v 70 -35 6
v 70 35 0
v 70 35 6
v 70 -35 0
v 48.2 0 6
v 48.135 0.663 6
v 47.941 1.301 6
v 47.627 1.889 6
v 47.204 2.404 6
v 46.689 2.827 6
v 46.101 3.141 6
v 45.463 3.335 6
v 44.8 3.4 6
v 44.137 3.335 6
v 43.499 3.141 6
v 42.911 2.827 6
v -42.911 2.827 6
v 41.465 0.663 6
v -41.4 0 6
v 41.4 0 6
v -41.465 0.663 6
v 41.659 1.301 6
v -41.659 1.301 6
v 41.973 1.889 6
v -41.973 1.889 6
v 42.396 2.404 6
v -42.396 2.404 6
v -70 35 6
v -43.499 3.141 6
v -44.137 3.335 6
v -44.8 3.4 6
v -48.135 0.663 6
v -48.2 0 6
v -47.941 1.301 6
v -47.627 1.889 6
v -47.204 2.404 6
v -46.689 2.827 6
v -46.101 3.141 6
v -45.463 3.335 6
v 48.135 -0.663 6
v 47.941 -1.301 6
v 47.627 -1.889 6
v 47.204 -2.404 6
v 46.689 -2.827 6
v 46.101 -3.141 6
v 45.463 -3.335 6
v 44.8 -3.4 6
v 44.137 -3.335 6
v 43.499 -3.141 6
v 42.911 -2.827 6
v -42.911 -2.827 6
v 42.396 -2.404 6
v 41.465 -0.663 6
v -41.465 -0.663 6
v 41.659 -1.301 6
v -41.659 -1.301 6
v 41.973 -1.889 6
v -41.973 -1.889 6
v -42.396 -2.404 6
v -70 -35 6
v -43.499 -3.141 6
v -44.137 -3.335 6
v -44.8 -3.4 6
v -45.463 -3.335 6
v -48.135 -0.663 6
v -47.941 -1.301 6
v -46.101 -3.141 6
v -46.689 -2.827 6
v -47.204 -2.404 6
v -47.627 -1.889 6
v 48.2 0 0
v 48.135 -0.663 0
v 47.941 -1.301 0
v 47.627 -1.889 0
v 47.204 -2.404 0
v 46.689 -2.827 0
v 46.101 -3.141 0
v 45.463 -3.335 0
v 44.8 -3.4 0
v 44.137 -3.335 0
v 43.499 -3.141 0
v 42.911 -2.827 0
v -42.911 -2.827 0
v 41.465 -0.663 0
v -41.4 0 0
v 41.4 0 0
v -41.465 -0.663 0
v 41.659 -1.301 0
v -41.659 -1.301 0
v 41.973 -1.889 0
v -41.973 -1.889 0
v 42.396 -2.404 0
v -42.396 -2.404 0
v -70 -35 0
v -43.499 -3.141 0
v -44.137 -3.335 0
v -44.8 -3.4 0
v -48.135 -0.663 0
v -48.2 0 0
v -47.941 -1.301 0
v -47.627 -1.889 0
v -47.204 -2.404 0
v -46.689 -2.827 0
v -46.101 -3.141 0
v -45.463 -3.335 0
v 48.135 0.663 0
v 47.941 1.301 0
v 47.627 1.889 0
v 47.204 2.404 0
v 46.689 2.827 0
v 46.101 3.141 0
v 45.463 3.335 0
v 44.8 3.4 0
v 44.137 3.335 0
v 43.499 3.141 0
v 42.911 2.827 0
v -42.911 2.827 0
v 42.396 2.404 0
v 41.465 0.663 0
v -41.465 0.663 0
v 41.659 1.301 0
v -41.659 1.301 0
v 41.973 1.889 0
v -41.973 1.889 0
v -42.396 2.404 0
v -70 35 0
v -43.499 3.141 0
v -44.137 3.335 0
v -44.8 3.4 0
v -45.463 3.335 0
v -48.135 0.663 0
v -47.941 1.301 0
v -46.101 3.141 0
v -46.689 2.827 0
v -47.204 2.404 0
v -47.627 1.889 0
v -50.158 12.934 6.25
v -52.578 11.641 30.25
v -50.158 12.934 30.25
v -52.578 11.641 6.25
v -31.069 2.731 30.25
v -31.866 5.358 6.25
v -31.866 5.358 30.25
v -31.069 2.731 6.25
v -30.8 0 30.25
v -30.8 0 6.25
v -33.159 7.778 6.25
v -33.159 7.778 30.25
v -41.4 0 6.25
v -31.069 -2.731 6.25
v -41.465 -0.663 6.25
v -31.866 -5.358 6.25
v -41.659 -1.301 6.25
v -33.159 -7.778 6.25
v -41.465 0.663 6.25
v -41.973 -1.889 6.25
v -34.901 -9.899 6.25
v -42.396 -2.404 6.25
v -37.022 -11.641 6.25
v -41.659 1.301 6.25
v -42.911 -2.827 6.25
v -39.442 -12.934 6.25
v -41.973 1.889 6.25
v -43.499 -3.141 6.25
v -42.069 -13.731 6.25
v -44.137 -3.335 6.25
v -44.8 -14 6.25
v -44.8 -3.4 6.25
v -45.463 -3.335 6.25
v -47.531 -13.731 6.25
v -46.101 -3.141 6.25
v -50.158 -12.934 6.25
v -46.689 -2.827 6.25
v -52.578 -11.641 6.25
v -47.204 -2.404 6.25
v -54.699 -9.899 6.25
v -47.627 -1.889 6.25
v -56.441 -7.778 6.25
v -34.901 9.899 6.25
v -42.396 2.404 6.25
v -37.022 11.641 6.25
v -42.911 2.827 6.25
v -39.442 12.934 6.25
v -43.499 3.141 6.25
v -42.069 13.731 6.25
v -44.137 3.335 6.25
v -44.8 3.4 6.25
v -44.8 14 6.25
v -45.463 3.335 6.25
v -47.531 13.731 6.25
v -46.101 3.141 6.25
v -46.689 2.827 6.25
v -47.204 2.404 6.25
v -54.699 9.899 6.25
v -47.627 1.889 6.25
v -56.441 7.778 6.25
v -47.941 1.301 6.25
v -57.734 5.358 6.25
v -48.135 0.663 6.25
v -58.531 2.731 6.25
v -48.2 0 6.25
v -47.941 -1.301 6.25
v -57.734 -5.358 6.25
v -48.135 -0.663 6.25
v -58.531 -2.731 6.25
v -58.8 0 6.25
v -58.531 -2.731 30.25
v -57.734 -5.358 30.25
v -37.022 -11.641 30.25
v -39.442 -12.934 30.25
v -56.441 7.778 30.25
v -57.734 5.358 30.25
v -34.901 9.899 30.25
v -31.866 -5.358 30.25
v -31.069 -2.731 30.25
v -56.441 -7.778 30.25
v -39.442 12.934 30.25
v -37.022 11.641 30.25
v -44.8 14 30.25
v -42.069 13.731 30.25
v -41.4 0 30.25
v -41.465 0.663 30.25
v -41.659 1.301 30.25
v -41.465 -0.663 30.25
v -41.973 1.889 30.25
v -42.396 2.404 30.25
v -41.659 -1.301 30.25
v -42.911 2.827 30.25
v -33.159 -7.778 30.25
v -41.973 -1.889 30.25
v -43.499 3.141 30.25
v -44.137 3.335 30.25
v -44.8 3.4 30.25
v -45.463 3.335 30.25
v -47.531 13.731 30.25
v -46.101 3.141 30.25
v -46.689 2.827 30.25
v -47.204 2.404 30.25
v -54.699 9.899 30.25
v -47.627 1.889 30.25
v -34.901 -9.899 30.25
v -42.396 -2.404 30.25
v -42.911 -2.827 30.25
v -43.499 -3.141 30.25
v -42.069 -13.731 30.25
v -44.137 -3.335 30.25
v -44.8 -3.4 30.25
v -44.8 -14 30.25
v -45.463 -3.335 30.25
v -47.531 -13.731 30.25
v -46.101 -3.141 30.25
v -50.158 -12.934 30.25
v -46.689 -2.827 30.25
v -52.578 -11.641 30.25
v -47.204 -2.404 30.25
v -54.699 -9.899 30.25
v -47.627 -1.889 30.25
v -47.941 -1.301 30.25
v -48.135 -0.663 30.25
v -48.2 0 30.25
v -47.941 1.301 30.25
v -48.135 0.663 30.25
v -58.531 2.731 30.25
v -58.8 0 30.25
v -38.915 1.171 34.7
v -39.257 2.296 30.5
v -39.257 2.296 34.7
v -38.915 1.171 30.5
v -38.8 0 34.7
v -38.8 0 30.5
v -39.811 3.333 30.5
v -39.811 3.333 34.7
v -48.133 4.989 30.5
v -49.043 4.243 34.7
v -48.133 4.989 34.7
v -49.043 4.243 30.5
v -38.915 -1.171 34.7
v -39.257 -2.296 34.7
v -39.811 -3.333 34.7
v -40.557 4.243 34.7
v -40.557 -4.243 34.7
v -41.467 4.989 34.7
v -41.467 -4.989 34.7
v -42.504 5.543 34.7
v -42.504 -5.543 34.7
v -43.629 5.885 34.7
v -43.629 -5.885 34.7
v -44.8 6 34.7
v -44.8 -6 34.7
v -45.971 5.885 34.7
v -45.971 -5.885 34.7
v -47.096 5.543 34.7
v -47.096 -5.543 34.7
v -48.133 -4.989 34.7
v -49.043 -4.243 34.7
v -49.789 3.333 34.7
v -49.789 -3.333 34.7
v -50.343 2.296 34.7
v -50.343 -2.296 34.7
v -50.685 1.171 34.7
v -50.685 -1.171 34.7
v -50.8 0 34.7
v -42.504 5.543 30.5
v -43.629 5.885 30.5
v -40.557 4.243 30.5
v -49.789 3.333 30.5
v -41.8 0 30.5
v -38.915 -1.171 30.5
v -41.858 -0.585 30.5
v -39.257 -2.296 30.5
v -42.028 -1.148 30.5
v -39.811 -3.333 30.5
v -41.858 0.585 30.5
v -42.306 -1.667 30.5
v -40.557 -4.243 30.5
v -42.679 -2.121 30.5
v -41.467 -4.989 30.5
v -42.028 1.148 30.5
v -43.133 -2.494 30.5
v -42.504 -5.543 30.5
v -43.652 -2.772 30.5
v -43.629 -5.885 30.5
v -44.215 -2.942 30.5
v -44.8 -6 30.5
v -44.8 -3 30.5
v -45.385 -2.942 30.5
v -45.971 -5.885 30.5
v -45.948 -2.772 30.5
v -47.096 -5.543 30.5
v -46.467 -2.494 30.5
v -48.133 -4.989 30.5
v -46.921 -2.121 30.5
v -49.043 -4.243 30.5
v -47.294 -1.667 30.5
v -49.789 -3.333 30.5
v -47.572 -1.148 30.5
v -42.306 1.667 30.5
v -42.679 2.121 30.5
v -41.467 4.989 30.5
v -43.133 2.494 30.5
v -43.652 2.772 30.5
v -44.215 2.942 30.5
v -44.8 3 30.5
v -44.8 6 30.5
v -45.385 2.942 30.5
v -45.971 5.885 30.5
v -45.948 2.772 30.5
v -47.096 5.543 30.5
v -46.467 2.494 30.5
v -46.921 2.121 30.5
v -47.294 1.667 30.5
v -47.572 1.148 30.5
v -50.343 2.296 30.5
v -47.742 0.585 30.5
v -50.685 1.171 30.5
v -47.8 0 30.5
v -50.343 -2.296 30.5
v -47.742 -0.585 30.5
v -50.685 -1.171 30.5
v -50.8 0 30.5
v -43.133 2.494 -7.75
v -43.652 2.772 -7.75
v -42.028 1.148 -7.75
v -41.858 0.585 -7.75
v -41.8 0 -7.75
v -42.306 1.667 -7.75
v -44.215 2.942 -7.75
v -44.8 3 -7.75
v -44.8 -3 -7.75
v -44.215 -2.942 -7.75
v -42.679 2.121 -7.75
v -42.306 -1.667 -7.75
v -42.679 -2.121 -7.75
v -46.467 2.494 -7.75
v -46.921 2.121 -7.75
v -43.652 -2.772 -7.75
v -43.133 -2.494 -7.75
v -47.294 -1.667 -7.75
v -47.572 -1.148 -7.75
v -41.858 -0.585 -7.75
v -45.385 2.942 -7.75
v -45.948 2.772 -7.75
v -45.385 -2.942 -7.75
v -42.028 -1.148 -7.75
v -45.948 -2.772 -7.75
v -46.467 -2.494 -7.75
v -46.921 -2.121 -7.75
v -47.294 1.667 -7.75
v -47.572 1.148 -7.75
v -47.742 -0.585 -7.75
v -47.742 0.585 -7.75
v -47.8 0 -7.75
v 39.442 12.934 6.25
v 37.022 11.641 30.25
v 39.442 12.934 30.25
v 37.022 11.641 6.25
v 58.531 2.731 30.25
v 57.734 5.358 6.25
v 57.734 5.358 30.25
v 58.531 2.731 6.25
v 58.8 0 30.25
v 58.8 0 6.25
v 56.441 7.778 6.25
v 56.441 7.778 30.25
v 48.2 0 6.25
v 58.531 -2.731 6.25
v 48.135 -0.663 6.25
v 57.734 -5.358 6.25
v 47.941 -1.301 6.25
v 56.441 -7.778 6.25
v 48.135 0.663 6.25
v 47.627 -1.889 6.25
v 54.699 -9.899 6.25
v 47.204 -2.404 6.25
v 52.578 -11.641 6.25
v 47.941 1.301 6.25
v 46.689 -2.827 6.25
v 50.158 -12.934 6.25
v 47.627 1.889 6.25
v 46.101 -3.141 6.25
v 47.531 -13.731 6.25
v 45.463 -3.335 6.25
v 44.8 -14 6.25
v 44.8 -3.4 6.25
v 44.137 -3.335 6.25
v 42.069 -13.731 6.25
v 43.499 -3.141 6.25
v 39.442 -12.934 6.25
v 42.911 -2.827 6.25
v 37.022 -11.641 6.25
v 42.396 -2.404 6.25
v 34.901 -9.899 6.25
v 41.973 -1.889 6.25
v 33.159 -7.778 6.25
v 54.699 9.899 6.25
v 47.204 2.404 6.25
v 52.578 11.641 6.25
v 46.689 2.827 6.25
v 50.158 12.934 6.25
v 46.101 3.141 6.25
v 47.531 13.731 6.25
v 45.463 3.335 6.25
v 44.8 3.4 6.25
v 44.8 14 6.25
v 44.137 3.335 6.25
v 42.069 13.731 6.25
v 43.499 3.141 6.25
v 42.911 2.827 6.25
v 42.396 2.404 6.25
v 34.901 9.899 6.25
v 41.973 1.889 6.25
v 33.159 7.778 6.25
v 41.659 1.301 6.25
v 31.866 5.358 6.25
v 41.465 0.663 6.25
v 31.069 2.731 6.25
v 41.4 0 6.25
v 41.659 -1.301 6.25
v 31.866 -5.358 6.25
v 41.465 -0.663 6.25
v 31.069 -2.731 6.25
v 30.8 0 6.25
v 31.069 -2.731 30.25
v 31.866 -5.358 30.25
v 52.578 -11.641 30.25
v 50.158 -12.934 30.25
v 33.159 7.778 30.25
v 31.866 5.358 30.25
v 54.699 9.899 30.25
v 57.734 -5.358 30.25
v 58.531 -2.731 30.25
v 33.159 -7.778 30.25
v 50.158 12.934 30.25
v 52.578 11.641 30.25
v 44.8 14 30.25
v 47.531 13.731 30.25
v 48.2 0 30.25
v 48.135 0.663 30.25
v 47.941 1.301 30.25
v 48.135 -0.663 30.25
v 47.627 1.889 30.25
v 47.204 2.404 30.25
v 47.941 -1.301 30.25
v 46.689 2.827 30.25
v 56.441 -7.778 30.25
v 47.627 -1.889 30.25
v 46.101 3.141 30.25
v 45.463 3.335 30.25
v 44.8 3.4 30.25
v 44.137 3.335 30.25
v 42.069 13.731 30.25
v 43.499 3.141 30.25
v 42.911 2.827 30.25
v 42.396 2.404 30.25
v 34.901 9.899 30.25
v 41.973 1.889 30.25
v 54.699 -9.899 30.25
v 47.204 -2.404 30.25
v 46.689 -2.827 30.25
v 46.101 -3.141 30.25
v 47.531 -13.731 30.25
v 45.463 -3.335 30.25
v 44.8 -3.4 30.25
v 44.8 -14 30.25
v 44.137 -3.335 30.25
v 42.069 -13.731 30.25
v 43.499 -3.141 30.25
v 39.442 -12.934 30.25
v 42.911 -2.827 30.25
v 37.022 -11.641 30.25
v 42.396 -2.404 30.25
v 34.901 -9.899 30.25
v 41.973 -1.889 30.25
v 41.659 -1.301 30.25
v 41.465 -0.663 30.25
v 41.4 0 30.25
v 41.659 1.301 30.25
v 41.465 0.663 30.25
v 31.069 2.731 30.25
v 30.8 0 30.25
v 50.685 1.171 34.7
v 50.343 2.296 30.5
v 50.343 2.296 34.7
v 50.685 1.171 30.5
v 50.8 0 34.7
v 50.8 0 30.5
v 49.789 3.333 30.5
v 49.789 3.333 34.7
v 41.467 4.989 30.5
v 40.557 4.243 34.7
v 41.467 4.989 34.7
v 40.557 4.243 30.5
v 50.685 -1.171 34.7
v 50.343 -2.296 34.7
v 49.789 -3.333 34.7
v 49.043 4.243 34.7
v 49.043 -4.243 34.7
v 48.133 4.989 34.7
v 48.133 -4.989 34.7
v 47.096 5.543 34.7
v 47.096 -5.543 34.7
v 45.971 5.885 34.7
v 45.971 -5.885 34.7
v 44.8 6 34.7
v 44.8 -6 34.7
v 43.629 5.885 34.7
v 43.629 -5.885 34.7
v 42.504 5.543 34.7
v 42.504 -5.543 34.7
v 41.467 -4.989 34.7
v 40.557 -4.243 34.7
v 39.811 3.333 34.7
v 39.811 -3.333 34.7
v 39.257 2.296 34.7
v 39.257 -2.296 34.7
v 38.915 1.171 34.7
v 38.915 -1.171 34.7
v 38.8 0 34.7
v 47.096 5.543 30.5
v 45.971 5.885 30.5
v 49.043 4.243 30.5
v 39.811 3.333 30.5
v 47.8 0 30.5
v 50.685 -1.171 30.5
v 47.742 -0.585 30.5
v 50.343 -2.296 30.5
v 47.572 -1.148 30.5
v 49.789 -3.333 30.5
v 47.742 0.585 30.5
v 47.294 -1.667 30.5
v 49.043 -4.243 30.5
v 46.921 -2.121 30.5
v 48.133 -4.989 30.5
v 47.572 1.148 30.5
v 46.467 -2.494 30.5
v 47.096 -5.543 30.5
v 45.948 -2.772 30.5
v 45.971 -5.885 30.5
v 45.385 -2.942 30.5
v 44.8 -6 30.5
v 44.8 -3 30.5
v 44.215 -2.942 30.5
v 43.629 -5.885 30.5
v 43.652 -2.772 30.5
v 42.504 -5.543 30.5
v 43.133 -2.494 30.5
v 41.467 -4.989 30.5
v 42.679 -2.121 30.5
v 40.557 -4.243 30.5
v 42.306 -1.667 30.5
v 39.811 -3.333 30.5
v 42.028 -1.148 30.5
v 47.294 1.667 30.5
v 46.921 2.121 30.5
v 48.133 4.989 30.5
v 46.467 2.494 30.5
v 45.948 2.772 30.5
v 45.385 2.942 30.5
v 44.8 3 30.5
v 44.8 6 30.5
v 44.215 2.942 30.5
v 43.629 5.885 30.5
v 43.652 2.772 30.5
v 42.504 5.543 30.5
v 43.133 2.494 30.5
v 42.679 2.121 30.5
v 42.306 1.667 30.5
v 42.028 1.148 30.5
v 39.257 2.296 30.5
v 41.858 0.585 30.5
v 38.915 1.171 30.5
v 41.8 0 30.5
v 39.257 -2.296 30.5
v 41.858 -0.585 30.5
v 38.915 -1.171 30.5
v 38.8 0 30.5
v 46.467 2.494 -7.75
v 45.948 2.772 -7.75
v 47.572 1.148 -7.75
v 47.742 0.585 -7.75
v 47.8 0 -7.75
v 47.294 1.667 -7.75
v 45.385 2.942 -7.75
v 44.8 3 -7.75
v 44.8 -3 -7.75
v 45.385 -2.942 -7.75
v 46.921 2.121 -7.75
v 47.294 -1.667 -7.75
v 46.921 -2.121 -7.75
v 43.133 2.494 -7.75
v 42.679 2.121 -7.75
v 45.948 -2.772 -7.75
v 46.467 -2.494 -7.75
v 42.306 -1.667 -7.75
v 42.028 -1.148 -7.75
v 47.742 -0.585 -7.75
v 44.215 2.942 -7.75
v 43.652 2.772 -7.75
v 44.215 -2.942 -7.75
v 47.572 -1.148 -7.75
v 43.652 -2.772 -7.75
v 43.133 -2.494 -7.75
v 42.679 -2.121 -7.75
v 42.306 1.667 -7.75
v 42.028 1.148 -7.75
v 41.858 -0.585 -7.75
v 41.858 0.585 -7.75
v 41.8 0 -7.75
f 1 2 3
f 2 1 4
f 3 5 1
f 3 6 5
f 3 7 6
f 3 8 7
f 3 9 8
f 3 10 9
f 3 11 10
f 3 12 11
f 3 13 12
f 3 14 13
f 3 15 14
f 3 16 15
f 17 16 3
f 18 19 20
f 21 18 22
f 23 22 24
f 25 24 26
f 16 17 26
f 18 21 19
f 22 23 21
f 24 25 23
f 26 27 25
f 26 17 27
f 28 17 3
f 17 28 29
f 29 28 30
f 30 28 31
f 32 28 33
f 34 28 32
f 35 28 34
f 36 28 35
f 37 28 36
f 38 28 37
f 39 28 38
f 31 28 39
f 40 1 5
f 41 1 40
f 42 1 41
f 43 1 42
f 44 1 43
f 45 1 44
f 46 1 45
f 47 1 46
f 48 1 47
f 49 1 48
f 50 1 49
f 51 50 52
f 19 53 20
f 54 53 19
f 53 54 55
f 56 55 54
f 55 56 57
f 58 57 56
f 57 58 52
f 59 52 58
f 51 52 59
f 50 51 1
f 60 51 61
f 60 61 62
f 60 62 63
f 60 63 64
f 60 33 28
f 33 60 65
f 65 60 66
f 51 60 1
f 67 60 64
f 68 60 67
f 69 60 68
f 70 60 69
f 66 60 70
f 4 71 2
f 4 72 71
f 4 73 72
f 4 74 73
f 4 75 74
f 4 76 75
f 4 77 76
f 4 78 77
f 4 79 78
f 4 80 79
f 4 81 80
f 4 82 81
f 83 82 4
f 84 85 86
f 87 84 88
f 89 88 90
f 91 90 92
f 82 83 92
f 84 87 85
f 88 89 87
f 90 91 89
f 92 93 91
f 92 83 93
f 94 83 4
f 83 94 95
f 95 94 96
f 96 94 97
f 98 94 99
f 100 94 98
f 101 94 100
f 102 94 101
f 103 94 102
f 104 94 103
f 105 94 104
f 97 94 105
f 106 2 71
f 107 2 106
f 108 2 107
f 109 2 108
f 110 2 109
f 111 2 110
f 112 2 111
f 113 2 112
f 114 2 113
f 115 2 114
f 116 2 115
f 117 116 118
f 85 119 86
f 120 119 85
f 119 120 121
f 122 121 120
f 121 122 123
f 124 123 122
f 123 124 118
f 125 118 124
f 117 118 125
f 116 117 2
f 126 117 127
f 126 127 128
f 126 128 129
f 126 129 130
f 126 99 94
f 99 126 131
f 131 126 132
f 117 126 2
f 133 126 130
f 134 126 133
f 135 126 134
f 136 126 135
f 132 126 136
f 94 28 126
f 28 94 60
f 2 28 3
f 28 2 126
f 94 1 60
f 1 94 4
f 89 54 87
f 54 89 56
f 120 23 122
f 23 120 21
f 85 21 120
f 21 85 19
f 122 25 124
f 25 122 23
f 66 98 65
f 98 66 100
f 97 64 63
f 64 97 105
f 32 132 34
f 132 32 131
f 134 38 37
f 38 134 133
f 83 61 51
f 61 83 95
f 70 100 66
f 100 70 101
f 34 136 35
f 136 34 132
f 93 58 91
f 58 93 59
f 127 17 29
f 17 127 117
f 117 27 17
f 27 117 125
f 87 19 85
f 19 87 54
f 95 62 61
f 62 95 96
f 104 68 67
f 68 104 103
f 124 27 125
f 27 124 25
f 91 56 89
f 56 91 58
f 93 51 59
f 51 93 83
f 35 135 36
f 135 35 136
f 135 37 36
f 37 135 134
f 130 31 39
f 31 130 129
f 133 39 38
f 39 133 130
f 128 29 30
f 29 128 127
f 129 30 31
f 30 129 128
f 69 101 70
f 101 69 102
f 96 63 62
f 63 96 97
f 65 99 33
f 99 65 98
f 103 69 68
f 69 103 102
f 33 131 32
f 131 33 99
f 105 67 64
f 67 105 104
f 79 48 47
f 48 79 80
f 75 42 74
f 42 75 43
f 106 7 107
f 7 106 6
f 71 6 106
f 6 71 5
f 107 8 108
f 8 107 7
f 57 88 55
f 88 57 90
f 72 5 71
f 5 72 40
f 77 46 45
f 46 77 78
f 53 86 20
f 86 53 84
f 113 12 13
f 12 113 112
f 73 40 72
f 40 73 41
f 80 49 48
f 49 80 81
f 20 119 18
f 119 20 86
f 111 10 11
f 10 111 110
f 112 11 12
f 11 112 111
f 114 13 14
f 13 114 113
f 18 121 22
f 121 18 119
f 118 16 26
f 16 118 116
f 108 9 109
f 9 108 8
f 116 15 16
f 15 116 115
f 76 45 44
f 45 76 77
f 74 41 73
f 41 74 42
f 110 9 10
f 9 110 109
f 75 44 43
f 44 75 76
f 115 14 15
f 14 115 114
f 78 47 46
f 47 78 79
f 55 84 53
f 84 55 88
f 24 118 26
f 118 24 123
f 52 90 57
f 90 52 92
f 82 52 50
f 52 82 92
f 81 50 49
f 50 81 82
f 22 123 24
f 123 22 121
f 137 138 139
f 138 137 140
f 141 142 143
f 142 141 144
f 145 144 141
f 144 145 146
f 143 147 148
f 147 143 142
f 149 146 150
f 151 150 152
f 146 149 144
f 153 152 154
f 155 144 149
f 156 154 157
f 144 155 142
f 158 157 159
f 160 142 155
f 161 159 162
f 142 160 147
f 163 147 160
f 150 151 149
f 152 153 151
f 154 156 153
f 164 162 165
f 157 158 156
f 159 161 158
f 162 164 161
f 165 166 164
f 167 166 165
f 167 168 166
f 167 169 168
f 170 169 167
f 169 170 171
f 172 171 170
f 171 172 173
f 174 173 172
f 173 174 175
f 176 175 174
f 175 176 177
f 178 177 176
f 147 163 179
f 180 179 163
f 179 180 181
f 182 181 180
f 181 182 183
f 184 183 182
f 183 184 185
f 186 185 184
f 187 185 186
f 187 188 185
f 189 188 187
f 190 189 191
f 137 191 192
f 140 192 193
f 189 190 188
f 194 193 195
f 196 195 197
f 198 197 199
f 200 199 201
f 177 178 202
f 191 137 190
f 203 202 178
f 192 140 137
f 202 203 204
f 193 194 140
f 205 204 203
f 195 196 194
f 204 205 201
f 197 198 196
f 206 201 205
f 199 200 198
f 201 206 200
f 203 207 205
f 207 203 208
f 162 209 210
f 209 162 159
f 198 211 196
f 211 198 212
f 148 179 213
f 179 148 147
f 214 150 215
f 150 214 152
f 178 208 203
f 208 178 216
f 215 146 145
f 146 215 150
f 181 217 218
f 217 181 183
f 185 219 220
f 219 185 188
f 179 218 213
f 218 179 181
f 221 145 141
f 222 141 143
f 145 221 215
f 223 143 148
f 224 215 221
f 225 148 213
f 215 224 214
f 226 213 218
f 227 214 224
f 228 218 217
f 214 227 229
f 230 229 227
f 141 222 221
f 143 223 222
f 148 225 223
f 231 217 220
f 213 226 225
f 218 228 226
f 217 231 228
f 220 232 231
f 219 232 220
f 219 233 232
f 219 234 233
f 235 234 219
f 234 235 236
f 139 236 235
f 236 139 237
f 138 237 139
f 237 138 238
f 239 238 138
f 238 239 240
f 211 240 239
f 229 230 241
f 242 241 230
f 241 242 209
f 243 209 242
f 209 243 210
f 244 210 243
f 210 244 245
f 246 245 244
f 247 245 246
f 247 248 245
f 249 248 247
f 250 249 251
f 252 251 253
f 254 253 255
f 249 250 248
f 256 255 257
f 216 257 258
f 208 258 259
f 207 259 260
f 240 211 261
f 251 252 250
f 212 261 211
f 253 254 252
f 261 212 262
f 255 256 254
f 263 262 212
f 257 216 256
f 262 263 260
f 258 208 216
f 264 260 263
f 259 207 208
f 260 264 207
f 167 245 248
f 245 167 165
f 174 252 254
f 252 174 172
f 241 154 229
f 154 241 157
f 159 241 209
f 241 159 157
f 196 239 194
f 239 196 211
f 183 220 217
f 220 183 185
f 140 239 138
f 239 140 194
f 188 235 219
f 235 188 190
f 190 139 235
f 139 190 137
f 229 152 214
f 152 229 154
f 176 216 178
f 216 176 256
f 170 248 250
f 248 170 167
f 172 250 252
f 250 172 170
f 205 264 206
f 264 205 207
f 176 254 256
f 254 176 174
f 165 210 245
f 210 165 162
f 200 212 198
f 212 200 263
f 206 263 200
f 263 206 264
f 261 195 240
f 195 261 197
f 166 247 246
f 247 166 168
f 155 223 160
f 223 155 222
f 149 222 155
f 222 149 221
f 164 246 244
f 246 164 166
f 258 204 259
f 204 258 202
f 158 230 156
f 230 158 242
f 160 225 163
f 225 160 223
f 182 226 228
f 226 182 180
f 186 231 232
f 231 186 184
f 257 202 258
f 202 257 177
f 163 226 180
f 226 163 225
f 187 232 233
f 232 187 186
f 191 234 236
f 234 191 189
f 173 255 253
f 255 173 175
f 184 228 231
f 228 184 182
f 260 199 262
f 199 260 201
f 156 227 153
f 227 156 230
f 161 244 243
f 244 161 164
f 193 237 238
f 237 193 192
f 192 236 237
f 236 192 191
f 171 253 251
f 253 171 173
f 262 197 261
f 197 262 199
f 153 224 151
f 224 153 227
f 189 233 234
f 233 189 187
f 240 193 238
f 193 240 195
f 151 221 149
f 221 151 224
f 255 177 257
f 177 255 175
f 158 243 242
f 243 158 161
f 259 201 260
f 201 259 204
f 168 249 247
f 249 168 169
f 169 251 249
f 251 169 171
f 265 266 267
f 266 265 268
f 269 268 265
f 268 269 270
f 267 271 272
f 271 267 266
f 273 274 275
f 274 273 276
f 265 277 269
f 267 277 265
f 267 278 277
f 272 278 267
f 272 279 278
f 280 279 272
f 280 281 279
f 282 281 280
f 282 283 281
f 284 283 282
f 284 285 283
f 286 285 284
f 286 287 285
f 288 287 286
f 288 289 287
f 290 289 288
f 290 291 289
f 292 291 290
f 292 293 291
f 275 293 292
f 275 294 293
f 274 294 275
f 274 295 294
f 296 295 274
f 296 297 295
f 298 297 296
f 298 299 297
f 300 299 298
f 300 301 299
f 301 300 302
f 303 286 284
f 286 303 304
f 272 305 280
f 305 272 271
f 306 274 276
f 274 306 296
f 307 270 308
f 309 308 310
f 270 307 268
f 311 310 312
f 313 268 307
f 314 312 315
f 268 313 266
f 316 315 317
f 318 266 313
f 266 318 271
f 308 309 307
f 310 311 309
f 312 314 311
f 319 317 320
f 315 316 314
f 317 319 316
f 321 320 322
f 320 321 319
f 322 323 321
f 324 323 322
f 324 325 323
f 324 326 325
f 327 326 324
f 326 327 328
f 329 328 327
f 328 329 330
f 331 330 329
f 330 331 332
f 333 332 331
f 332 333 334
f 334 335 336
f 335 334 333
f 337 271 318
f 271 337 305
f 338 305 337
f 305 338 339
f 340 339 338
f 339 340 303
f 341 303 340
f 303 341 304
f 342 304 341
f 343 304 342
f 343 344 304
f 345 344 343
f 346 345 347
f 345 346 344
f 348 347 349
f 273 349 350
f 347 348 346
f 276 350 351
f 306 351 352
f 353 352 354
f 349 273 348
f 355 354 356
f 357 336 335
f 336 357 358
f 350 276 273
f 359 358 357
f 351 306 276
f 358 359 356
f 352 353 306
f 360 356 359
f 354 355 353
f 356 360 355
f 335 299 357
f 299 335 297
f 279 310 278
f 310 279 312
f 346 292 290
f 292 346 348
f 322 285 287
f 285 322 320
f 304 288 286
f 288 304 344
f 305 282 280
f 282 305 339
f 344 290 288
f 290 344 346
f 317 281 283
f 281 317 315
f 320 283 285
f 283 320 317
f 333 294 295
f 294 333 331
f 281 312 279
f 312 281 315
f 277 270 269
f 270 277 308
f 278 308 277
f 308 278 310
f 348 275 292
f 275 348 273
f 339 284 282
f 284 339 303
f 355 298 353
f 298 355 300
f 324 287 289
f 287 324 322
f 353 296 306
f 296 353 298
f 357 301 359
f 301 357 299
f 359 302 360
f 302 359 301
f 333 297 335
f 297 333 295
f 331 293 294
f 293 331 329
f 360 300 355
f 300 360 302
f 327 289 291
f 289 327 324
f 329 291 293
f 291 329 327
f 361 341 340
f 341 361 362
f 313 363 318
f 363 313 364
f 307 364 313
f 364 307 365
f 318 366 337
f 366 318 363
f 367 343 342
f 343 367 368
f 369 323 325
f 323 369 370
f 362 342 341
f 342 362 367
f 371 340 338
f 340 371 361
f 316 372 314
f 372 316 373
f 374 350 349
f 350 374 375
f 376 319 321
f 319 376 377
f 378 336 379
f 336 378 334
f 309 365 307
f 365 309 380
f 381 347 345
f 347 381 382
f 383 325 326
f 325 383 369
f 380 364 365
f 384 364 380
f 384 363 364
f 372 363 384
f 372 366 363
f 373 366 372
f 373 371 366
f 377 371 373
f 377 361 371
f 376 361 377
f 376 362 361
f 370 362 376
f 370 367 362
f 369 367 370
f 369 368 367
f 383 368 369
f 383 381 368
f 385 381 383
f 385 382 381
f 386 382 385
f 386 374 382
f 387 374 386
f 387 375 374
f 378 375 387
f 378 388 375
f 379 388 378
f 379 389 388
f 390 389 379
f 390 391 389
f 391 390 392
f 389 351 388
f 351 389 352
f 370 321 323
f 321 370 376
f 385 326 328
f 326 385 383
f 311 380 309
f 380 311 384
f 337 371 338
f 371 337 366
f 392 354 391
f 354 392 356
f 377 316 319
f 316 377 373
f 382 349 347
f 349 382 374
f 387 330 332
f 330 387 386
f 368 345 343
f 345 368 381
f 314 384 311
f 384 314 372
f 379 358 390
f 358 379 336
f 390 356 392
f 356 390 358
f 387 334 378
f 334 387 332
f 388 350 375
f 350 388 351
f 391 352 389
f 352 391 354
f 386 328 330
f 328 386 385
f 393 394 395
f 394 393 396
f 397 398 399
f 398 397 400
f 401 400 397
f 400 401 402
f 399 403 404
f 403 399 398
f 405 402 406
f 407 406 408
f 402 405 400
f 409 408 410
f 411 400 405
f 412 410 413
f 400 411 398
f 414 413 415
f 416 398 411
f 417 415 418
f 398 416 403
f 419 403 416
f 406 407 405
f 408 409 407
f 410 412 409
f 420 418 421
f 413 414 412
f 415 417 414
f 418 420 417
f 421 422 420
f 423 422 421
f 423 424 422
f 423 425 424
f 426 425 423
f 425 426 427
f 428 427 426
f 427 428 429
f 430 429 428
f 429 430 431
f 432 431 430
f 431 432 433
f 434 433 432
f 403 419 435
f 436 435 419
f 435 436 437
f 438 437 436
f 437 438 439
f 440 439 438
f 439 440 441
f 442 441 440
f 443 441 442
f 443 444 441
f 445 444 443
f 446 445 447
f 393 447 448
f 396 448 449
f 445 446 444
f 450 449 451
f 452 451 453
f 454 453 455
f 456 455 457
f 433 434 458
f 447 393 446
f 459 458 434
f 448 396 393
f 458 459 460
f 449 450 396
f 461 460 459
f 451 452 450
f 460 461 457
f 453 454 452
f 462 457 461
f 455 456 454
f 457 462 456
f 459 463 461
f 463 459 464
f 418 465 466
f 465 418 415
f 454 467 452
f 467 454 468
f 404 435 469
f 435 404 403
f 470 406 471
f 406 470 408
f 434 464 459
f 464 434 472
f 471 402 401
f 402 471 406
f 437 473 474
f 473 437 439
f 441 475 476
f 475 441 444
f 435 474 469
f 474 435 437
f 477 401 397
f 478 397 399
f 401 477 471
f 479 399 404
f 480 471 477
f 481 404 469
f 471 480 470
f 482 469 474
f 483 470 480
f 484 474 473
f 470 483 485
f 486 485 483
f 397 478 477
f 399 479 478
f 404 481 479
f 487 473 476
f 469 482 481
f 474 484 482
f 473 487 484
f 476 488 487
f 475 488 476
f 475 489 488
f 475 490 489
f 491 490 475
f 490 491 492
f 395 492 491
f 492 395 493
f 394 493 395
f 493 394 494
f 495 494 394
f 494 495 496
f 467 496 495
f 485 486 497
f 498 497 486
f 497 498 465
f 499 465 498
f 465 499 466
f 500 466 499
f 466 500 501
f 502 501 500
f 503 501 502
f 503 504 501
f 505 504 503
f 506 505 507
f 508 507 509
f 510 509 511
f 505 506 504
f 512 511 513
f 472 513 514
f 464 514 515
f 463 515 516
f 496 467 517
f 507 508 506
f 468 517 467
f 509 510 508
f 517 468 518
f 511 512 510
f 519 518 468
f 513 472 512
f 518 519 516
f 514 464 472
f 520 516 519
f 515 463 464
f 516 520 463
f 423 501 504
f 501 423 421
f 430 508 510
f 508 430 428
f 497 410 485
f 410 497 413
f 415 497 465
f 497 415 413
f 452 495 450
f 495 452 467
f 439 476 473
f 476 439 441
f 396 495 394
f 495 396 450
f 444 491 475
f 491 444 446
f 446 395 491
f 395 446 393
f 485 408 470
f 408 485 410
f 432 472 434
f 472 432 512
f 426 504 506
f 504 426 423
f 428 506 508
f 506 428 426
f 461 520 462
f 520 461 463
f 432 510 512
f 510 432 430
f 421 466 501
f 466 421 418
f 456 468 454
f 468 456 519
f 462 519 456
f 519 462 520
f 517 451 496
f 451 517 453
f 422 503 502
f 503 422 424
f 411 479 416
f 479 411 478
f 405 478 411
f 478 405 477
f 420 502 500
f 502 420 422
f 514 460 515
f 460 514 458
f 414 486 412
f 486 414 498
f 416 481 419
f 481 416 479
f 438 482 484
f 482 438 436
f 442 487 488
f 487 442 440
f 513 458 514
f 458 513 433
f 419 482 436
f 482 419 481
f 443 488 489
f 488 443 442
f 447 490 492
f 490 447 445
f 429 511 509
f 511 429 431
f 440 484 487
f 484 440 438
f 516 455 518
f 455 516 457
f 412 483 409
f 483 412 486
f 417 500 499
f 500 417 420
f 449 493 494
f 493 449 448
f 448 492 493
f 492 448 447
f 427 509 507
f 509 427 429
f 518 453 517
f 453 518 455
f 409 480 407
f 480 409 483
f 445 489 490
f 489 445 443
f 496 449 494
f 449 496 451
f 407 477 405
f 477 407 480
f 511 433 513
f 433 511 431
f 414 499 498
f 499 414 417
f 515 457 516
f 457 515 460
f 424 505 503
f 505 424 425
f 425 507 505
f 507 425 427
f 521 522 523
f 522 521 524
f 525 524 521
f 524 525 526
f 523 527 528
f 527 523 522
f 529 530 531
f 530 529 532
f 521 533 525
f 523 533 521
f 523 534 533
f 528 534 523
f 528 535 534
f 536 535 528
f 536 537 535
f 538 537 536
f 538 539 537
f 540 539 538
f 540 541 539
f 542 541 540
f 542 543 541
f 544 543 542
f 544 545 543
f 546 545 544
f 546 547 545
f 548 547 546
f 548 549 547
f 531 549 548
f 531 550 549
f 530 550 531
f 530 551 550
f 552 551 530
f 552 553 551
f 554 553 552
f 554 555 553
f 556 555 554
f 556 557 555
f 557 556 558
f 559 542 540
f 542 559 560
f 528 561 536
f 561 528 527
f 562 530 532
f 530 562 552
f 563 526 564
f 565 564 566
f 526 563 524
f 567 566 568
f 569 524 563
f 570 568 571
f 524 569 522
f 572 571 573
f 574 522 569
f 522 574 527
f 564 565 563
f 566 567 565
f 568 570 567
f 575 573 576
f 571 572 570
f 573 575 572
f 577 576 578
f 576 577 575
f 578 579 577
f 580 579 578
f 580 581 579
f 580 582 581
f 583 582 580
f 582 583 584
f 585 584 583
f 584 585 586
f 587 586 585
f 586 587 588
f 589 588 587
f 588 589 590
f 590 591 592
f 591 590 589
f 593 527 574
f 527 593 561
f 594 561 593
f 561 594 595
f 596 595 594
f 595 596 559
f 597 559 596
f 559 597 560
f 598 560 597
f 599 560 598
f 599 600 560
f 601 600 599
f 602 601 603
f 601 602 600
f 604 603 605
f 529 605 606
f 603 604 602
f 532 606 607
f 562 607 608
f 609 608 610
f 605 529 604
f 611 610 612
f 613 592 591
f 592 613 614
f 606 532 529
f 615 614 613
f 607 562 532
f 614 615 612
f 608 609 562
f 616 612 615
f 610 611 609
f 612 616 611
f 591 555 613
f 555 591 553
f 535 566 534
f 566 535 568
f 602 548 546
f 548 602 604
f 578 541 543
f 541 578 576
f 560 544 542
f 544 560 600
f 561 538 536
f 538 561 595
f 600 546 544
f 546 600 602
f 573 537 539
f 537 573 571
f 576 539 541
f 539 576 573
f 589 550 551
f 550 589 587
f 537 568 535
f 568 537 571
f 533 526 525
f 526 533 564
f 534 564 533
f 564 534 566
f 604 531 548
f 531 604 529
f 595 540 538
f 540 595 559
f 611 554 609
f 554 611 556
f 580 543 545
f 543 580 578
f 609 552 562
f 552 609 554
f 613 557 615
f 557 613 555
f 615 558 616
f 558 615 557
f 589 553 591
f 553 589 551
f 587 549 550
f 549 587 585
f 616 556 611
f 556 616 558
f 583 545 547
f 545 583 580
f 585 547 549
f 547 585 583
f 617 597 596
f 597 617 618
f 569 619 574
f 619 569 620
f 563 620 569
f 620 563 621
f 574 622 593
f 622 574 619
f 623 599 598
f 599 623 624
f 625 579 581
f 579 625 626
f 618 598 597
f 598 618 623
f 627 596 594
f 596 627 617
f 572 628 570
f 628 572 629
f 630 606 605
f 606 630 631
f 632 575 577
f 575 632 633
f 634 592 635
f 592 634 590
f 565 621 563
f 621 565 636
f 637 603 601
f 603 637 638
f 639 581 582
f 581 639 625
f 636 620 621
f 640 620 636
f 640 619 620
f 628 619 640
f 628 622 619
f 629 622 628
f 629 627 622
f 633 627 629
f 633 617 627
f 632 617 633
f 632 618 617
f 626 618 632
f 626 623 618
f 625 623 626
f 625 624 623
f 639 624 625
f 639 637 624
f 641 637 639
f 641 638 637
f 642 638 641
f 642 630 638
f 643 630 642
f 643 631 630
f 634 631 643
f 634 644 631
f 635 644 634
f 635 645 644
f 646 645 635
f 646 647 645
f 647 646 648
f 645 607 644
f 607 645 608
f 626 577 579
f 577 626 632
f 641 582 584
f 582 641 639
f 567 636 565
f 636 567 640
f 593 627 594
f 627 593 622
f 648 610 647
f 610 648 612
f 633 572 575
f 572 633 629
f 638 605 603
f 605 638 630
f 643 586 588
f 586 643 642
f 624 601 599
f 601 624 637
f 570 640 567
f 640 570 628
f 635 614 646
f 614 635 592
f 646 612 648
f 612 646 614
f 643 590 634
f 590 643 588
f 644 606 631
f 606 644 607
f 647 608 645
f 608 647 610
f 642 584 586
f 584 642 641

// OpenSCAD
$fn = 32;

// ------------------------------------------------------------------------
// Standoff columns: 2 d28 standoffs, bolts d6
// Every part is its own module, assembly() places them once.
// ------------------------------------------------------------------------

// --- part 1 ---
module base_plate() {
  difference() {
    translate([-70, -35, 0]) cube([140, 70, 6]);
    translate([-44.8, 0, -1]) cylinder(h = 8, d = 6.8);
    translate([44.8, 0, -1]) cylinder(h = 8, d = 6.8);
  }
}

// --- part 2 ---
module spacer1() {
  difference() {
      translate([0, 0, 0]) cylinder(h = 24, d = 28);
      translate([0, 0, -1]) cylinder(h = 26, d = 6.8);
    }
}

// --- part 3 ---
module bolt1() {
  cylinder(h = 4.2, d = 12);
  translate([0, 0, -38.25]) cylinder(h = 38.25, d = 6);
}

// --- part 4 ---
module spacer2() {
  difference() {
      translate([0, 0, 0]) cylinder(h = 24, d = 28);
      translate([0, 0, -1]) cylinder(h = 26, d = 6.8);
    }
}

// --- part 5 ---
module bolt2() {
  cylinder(h = 4.2, d = 12);
  translate([0, 0, -38.25]) cylinder(h = 38.25, d = 6);
}

// --- assembly ---
module assembly() {
  translate([0, 0, 0]) rotate([0, 0, 0]) base_plate();
  translate([-44.8, 0, 6.25]) rotate([0, 0, 0]) spacer1();
  translate([-44.8, 0, 30.5]) rotate([0, 0, 0]) bolt1();
  translate([44.8, 0, 6.25]) rotate([0, 0, 0]) spacer2();
  translate([44.8, 0, 30.5]) rotate([0, 0, 0]) bolt2();
}

assembly();
